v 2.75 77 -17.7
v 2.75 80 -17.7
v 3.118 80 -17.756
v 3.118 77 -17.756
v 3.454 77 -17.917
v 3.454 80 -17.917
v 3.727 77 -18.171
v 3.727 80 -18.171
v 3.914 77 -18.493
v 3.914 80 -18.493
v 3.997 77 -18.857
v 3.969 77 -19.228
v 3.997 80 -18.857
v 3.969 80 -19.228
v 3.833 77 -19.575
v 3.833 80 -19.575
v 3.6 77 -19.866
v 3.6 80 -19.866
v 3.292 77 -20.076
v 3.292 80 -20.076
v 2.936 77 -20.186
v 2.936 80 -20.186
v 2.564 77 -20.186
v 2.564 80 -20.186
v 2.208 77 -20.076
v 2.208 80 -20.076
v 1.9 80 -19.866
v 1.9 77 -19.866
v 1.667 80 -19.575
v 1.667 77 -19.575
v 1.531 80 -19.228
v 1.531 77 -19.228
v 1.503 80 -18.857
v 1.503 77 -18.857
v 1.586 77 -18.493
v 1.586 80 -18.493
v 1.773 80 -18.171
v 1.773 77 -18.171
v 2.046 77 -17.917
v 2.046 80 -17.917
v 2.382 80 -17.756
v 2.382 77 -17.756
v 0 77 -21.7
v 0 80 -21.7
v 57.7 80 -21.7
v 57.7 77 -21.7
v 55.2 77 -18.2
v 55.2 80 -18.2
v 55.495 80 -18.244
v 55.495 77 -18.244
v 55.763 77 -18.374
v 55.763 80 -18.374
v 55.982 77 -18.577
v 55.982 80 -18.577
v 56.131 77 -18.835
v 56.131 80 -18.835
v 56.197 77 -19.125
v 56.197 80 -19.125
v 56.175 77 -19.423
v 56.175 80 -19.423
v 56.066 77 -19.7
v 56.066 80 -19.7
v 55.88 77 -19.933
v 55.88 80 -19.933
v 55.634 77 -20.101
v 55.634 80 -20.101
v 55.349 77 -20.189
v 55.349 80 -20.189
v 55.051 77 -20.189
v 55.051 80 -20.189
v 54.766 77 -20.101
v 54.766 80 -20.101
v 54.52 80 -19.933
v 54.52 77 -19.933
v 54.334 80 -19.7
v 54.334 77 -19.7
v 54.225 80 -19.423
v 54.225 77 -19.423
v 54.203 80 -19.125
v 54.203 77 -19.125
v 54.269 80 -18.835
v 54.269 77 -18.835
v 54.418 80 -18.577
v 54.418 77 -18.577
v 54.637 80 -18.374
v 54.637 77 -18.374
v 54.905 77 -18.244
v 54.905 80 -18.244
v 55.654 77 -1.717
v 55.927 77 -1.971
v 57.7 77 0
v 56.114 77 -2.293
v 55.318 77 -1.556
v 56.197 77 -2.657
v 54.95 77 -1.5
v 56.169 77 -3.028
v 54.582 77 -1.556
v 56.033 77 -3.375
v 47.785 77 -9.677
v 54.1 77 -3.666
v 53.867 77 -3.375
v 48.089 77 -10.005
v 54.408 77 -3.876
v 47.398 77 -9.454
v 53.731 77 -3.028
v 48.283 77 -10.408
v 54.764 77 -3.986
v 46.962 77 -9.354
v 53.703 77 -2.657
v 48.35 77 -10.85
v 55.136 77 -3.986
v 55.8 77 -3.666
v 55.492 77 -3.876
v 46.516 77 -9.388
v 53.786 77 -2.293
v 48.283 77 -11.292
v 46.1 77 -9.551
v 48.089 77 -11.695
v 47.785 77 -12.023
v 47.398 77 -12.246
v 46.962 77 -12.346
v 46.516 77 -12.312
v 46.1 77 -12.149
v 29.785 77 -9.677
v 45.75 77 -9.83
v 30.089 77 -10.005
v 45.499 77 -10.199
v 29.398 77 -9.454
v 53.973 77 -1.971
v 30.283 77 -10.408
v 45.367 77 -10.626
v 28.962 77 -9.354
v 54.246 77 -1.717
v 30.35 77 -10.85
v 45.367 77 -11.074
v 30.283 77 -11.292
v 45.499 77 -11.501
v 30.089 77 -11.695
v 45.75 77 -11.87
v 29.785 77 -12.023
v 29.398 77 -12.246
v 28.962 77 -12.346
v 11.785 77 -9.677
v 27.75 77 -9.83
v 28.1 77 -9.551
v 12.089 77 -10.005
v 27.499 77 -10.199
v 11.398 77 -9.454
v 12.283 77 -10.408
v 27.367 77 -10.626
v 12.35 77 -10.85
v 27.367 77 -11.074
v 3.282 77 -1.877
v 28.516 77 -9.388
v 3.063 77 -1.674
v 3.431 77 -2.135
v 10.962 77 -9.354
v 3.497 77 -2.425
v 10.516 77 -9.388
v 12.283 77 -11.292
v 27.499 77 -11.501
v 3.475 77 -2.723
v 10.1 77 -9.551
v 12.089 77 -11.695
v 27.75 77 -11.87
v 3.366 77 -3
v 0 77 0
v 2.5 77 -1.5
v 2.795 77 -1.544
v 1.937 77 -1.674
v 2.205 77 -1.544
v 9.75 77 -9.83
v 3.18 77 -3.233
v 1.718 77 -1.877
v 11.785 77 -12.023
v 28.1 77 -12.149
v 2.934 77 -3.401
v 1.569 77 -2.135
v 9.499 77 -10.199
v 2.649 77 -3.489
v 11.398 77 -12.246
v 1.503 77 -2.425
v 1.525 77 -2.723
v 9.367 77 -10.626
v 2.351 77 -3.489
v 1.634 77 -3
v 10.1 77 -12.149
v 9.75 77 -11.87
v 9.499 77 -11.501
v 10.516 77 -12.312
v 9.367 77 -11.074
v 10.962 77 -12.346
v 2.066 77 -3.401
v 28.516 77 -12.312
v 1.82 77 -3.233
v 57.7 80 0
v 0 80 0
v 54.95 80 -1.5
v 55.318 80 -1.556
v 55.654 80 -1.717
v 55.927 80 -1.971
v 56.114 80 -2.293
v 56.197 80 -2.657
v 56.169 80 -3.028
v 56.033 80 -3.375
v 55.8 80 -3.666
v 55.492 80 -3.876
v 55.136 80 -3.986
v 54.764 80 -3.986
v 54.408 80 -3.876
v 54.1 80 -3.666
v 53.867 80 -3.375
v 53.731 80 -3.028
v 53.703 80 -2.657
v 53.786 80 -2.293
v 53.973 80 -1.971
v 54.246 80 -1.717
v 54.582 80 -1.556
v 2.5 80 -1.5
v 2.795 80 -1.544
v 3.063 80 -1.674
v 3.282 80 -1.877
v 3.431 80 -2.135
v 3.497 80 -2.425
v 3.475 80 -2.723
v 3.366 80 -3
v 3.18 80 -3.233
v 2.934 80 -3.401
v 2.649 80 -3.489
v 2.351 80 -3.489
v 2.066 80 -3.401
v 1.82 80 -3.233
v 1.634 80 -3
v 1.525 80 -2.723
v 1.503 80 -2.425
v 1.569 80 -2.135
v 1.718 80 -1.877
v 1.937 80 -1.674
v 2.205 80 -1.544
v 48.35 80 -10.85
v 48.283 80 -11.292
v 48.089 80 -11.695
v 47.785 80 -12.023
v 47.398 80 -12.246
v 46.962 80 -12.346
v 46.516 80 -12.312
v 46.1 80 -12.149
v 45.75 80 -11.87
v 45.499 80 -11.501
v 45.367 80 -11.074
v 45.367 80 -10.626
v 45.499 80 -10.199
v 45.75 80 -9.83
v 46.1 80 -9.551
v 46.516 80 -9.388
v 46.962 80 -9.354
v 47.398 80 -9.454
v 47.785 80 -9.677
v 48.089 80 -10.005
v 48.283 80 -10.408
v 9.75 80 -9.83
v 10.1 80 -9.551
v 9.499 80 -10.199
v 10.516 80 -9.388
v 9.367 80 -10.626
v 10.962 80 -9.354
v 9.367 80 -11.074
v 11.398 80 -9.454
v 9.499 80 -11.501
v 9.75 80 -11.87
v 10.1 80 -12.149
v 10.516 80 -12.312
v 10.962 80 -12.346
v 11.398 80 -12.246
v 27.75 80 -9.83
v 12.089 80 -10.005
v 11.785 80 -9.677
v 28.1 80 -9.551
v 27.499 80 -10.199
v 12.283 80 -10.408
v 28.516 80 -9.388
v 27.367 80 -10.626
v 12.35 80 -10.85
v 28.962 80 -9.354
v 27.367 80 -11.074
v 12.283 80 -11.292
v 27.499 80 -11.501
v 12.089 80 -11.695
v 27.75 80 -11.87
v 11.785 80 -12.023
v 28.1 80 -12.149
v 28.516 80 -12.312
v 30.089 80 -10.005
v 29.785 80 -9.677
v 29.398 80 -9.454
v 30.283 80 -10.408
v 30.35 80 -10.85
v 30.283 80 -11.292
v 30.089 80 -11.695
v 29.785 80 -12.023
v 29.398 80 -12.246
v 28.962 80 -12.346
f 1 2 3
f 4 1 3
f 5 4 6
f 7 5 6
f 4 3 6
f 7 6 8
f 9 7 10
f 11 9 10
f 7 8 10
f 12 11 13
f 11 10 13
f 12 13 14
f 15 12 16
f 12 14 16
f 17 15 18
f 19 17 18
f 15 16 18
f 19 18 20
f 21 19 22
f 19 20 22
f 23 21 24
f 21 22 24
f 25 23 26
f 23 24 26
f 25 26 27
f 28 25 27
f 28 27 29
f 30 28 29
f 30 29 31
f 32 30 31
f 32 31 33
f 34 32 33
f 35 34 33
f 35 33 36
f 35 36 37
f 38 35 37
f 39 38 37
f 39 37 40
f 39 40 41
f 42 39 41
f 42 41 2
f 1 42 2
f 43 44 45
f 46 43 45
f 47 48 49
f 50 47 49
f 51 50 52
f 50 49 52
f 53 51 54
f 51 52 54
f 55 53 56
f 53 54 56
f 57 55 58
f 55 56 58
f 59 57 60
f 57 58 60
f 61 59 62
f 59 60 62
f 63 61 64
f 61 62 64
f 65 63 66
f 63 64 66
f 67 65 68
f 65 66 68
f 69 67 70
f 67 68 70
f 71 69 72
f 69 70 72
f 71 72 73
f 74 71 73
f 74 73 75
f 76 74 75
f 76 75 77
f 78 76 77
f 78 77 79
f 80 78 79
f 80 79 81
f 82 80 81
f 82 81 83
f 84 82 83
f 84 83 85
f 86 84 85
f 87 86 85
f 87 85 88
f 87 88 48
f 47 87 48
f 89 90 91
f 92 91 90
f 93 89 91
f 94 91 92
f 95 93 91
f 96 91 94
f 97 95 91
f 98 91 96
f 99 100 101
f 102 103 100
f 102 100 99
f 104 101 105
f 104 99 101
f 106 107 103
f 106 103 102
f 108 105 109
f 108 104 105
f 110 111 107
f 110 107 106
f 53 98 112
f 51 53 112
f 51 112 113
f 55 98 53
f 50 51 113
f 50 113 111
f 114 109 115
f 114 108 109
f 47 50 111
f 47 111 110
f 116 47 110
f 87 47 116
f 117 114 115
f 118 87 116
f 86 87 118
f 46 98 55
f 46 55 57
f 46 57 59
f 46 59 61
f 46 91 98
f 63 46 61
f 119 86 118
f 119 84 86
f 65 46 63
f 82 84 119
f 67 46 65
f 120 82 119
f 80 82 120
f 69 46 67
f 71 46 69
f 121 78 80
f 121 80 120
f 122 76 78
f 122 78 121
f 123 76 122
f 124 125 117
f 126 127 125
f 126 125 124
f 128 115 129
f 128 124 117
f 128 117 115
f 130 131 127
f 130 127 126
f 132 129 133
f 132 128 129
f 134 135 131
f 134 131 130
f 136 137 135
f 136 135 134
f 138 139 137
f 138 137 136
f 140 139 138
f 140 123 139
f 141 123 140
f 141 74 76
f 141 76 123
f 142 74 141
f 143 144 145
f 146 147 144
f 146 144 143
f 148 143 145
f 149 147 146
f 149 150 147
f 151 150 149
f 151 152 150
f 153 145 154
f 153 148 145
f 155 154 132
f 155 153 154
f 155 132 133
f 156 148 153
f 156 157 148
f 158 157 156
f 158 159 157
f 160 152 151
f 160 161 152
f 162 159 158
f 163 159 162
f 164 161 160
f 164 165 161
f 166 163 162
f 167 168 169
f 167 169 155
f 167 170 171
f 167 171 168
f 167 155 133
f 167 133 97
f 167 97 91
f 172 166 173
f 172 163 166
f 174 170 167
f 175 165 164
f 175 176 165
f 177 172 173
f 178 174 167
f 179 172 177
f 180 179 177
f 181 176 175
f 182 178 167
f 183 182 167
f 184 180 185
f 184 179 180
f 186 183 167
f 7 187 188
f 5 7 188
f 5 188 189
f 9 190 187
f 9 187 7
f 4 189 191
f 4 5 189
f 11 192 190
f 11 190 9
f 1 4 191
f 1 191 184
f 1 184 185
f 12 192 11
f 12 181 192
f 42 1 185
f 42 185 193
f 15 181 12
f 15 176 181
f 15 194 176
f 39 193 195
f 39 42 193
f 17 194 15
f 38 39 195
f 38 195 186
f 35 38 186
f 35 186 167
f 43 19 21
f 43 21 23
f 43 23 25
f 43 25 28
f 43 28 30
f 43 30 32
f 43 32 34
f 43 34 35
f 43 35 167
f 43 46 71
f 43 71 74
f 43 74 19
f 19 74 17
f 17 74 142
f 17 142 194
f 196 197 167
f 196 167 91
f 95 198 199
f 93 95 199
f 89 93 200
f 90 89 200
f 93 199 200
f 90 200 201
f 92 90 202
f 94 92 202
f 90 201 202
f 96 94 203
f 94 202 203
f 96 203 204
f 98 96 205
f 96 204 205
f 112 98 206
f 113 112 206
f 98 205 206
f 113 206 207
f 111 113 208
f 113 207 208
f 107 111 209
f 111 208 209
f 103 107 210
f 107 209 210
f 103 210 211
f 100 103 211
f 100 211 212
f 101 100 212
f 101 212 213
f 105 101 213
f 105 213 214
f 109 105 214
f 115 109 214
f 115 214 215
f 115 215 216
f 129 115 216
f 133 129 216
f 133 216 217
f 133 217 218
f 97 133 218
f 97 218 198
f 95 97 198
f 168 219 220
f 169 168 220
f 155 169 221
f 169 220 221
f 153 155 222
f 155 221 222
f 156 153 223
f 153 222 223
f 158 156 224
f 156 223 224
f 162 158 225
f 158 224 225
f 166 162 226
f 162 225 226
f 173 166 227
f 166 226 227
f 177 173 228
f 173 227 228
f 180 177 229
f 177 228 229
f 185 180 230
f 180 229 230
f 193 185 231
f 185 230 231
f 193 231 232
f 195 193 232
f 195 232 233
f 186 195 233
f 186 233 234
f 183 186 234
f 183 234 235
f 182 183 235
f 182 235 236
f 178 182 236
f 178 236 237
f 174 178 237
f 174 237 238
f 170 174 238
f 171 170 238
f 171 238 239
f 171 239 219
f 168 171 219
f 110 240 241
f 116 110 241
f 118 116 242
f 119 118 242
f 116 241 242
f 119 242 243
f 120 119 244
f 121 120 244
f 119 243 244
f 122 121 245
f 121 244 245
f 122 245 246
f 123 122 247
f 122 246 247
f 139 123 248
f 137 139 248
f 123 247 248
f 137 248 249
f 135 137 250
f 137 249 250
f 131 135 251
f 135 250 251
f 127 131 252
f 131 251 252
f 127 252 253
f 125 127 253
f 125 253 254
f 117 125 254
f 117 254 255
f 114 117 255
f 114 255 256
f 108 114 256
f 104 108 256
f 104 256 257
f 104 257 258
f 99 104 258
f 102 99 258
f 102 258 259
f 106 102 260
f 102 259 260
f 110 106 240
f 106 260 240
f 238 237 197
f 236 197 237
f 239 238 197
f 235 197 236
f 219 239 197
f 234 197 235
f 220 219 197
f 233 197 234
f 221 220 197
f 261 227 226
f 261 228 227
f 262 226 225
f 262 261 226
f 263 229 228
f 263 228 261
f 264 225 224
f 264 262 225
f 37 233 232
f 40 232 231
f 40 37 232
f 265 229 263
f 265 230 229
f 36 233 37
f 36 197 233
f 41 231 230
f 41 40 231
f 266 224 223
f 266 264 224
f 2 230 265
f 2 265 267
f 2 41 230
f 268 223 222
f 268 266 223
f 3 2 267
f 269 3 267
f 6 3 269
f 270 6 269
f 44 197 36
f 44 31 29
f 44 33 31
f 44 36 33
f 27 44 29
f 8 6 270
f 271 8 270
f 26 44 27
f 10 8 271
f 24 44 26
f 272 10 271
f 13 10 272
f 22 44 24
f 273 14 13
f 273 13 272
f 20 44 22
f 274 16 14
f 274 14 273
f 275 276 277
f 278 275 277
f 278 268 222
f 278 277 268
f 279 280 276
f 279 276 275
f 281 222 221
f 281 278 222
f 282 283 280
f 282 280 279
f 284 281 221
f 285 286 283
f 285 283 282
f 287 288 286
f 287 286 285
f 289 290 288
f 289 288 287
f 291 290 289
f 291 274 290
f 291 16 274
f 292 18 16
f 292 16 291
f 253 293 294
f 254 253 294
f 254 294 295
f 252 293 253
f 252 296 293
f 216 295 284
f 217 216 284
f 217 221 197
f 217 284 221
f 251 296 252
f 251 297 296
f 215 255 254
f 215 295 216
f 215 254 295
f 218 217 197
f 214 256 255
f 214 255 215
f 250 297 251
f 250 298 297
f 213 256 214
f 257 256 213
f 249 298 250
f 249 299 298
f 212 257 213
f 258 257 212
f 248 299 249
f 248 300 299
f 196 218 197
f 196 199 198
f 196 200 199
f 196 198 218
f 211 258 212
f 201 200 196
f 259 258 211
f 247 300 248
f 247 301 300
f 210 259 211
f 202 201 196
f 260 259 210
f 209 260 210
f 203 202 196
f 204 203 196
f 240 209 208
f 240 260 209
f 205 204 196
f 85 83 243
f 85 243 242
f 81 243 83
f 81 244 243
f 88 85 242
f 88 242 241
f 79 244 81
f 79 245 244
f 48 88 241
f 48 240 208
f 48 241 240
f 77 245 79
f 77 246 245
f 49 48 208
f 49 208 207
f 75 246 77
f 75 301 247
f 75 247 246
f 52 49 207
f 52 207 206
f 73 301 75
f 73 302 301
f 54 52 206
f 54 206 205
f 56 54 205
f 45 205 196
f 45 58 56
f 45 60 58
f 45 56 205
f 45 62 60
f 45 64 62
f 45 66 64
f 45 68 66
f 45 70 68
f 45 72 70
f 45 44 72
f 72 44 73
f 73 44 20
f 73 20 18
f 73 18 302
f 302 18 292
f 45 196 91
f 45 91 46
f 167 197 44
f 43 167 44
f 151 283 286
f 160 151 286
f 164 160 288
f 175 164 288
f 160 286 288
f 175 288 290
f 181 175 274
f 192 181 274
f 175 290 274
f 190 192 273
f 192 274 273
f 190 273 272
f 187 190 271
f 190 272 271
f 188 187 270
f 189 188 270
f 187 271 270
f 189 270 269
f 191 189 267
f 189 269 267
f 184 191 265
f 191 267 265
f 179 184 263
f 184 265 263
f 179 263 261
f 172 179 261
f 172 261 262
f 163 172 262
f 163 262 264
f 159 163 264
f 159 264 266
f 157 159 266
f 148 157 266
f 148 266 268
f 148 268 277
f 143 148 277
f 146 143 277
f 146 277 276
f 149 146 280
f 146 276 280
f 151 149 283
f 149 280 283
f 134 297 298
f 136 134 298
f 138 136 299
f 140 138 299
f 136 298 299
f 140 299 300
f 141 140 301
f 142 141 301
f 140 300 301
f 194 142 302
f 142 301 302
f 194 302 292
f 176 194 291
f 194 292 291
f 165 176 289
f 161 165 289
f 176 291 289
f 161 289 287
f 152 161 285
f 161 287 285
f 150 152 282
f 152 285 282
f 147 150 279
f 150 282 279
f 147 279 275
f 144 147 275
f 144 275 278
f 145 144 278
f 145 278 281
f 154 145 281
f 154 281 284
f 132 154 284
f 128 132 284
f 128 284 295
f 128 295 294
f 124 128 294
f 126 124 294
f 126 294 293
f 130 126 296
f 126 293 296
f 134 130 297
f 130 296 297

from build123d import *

# Parameters (mm, degrees)
SKETCH1_W           = 57.7
SKETCH1_H           = 21.7
BOSS_EXTRUDE1_DEPTH = 2
SKETCH2_W           = 57.7
SKETCH2_H           = 21.7
SKETCH2_W_2         = 54.7
SKETCH2_H_2         = 18.7
BOSS_EXTRUDE2_DEPTH = 75
FILLET1_R           = 8
SKETCH3_W           = 38.583587397
SKETCH3_H           = 2.5
CUT_EXTRUDE1_DEPTH  = 75
SKETCH4_W           = 17.089400488
SKETCH4_H           = 2.5
CUT_EXTRUDE2_DEPTH  = 75
SKETCH5_R           = 1
CUT_EXTRUDE3_DEPTH  = 8
BOSS_EXTRUDE3_START = 3
SKETCH6_W           = 57.7
SKETCH6_H           = 21.7
SKETCH6_R           = 1
SKETCH6_R_2         = 1.25
BOSS_EXTRUDE3_DEPTH = 3
CUT_EXTRUDE4_DEPTH  = 3
CUT_EXTRUDE5_START  = -3
SKETCH8_R           = 1.5
CUT_EXTRUDE5_DEPTH  = 3
SKETCH9_W           = 91.990762183
SKETCH9_H           = 98.377858587
CUT_EXTRUDE7_DEPTH  = 69


with BuildPart() as part:
    # Sketch1 → Boss-Extrude1 (new body)
    with BuildSketch(Plane(origin=(0, 0, 0), x_dir=(1, 0, 0), z_dir=(0, 1, 0))):
        with Locations((28.85, 10.85)):
            Rectangle(SKETCH1_W, SKETCH1_H)
    extrude(amount=BOSS_EXTRUDE1_DEPTH)

    # Sketch2 → Boss-Extrude2 (add)
    with BuildSketch(Plane(origin=(0, 2, 0), x_dir=(1, 0, 0), z_dir=(0, 1, 0))):
        with Locations((28.85, 10.85)):
            Rectangle(SKETCH2_W, SKETCH2_H)
        with Locations((28.85, 10.85)):
            Rectangle(SKETCH2_W_2, SKETCH2_H_2, mode=Mode.SUBTRACT)
    extrude(amount=BOSS_EXTRUDE2_DEPTH)

    # Fillet1
    fillet1_edges = [part.edges().sort_by_distance(p)[0] for p in [
        (1.5, 39.5, -20.2),
        (1.5, 39.5, -1.5),
        (56.2, 39.5, -1.5),
        (56.2, 39.5, -20.2),
    ]]
    fillet(fillet1_edges, radius=FILLET1_R)

    # Sketch3 → Cut-Extrude1 (cut)
    with BuildSketch(Plane(origin=(0, 77, 0), x_dir=(1, 0, 0), z_dir=(0, 1, 0))):
        with Locations((20.791793699, 18.95)):
            Rectangle(SKETCH3_W, SKETCH3_H)
    extrude(amount=-CUT_EXTRUDE1_DEPTH, mode=Mode.SUBTRACT)

    # Sketch4 → Cut-Extrude2 (cut)
    with BuildSketch(Plane(origin=(0, 77, 0), x_dir=(1, 0, 0), z_dir=(0, 1, 0))):
        with Locations((47.655299756, 2.75)):
            Rectangle(SKETCH4_W, SKETCH4_H)
    extrude(amount=-CUT_EXTRUDE2_DEPTH, mode=Mode.SUBTRACT)

    # Sketch5 → Cut-Extrude3 (cut)
    with BuildSketch(Plane(origin=(0, 77, 0), x_dir=(1, 0, 0), z_dir=(0, 1, 0))):
        with Locations(Location((55.2, 19.2, 0), (0, 0, 270))):
            Circle(SKETCH5_R)
        with Locations(Location((2.5, 2.5, 0), (0, 0, 270))):
            Circle(SKETCH5_R)
    extrude(amount=-CUT_EXTRUDE3_DEPTH, mode=Mode.SUBTRACT)

    # Sketch6 → Boss-Extrude3 (add)
    with BuildSketch(Plane(origin=(0, 77, 0), x_dir=(1, 0, 0), z_dir=(0, 1, 0)).offset(BOSS_EXTRUDE3_START)):
        with Locations((28.85, 10.85)):
            Rectangle(SKETCH6_W, SKETCH6_H)
        with Locations(Location((2.5, 2.5, 0), (0, 0, 270))):
            Circle(SKETCH6_R, mode=Mode.SUBTRACT)
        with Locations(Location((55.2, 19.2, 0), (0, 0, 270))):
            Circle(SKETCH6_R, mode=Mode.SUBTRACT)
        with Locations(Location((2.75, 18.95, 0), (0, 0, 270))):
            Circle(SKETCH6_R_2, mode=Mode.SUBTRACT)
        with Locations(Location((54.95, 2.75, 0), (0, 0, 270))):
            Circle(SKETCH6_R_2, mode=Mode.SUBTRACT)
    extrude(amount=-BOSS_EXTRUDE3_DEPTH)

    # Sketch7 → Cut-Extrude4 (cut)
    with BuildSketch(Plane(origin=(0, 80, 0), x_dir=(1, 0, 0), z_dir=(0, 1, 0))):
        with BuildLine():
            ThreePointArc((9.35, 10.85), (10.85, 9.35), (12.35, 10.85))
            Line((12.35, 10.85), (10.85, 10.85))
            Line((10.85, 10.85), (9.35, 10.85))
        make_face()
        with BuildLine():
            Line((10.85, 10.85), (12.35, 10.85))
            ThreePointArc((12.35, 10.85), (10.85, 12.35), (9.35, 10.85))
            Line((9.35, 10.85), (10.85, 10.85))
        make_face()
        with BuildLine():
            ThreePointArc((27.35, 10.85), (28.85, 9.35), (30.35, 10.85))
            Line((30.35, 10.85), (28.85, 10.85))
            Line((28.85, 10.85), (27.35, 10.85))
        make_face()
        with BuildLine():
            Line((28.85, 10.85), (30.35, 10.85))
            ThreePointArc((30.35, 10.85), (28.85, 12.35), (27.35, 10.85))
            Line((27.35, 10.85), (28.85, 10.85))
        make_face()
        with BuildLine():
            ThreePointArc((45.35, 10.85), (46.85, 9.35), (48.35, 10.85))
            Line((48.35, 10.85), (46.85, 10.85))
            Line((46.85, 10.85), (45.35, 10.85))
        make_face()
        with BuildLine():
            Line((46.85, 10.85), (48.35, 10.85))
            ThreePointArc((48.35, 10.85), (46.85, 12.35), (45.35, 10.85))
            Line((45.35, 10.85), (46.85, 10.85))
        make_face()
    extrude(amount=-CUT_EXTRUDE4_DEPTH, mode=Mode.SUBTRACT)

    # Sketch8 → Cut-Extrude5 (cut)
    with BuildSketch(Plane.XZ.offset(CUT_EXTRUDE5_START)):
        with Locations(Location((10.85, -10.85, 0), (0, 0, 90))):
            Circle(SKETCH8_R)
        with Locations(Location((28.85, -10.85, 0), (0, 0, 90))):
            Circle(SKETCH8_R)
        with Locations(Location((46.85, -10.85, 0), (0, 0, 90))):
            Circle(SKETCH8_R)
    extrude(amount=CUT_EXTRUDE5_DEPTH, mode=Mode.SUBTRACT)

    # Sketch9 → Cut-Extrude7 (cut)
    with BuildSketch(Plane(origin=(0, 0, -21.7), x_dir=(-1, 0, 0), z_dir=(0, 0, -1))):
        with Locations((-24.534497704, 27.811070706)):
            Rectangle(SKETCH9_W, SKETCH9_H)
    extrude(amount=-CUT_EXTRUDE7_DEPTH, mode=Mode.SUBTRACT)


solid = part.part
